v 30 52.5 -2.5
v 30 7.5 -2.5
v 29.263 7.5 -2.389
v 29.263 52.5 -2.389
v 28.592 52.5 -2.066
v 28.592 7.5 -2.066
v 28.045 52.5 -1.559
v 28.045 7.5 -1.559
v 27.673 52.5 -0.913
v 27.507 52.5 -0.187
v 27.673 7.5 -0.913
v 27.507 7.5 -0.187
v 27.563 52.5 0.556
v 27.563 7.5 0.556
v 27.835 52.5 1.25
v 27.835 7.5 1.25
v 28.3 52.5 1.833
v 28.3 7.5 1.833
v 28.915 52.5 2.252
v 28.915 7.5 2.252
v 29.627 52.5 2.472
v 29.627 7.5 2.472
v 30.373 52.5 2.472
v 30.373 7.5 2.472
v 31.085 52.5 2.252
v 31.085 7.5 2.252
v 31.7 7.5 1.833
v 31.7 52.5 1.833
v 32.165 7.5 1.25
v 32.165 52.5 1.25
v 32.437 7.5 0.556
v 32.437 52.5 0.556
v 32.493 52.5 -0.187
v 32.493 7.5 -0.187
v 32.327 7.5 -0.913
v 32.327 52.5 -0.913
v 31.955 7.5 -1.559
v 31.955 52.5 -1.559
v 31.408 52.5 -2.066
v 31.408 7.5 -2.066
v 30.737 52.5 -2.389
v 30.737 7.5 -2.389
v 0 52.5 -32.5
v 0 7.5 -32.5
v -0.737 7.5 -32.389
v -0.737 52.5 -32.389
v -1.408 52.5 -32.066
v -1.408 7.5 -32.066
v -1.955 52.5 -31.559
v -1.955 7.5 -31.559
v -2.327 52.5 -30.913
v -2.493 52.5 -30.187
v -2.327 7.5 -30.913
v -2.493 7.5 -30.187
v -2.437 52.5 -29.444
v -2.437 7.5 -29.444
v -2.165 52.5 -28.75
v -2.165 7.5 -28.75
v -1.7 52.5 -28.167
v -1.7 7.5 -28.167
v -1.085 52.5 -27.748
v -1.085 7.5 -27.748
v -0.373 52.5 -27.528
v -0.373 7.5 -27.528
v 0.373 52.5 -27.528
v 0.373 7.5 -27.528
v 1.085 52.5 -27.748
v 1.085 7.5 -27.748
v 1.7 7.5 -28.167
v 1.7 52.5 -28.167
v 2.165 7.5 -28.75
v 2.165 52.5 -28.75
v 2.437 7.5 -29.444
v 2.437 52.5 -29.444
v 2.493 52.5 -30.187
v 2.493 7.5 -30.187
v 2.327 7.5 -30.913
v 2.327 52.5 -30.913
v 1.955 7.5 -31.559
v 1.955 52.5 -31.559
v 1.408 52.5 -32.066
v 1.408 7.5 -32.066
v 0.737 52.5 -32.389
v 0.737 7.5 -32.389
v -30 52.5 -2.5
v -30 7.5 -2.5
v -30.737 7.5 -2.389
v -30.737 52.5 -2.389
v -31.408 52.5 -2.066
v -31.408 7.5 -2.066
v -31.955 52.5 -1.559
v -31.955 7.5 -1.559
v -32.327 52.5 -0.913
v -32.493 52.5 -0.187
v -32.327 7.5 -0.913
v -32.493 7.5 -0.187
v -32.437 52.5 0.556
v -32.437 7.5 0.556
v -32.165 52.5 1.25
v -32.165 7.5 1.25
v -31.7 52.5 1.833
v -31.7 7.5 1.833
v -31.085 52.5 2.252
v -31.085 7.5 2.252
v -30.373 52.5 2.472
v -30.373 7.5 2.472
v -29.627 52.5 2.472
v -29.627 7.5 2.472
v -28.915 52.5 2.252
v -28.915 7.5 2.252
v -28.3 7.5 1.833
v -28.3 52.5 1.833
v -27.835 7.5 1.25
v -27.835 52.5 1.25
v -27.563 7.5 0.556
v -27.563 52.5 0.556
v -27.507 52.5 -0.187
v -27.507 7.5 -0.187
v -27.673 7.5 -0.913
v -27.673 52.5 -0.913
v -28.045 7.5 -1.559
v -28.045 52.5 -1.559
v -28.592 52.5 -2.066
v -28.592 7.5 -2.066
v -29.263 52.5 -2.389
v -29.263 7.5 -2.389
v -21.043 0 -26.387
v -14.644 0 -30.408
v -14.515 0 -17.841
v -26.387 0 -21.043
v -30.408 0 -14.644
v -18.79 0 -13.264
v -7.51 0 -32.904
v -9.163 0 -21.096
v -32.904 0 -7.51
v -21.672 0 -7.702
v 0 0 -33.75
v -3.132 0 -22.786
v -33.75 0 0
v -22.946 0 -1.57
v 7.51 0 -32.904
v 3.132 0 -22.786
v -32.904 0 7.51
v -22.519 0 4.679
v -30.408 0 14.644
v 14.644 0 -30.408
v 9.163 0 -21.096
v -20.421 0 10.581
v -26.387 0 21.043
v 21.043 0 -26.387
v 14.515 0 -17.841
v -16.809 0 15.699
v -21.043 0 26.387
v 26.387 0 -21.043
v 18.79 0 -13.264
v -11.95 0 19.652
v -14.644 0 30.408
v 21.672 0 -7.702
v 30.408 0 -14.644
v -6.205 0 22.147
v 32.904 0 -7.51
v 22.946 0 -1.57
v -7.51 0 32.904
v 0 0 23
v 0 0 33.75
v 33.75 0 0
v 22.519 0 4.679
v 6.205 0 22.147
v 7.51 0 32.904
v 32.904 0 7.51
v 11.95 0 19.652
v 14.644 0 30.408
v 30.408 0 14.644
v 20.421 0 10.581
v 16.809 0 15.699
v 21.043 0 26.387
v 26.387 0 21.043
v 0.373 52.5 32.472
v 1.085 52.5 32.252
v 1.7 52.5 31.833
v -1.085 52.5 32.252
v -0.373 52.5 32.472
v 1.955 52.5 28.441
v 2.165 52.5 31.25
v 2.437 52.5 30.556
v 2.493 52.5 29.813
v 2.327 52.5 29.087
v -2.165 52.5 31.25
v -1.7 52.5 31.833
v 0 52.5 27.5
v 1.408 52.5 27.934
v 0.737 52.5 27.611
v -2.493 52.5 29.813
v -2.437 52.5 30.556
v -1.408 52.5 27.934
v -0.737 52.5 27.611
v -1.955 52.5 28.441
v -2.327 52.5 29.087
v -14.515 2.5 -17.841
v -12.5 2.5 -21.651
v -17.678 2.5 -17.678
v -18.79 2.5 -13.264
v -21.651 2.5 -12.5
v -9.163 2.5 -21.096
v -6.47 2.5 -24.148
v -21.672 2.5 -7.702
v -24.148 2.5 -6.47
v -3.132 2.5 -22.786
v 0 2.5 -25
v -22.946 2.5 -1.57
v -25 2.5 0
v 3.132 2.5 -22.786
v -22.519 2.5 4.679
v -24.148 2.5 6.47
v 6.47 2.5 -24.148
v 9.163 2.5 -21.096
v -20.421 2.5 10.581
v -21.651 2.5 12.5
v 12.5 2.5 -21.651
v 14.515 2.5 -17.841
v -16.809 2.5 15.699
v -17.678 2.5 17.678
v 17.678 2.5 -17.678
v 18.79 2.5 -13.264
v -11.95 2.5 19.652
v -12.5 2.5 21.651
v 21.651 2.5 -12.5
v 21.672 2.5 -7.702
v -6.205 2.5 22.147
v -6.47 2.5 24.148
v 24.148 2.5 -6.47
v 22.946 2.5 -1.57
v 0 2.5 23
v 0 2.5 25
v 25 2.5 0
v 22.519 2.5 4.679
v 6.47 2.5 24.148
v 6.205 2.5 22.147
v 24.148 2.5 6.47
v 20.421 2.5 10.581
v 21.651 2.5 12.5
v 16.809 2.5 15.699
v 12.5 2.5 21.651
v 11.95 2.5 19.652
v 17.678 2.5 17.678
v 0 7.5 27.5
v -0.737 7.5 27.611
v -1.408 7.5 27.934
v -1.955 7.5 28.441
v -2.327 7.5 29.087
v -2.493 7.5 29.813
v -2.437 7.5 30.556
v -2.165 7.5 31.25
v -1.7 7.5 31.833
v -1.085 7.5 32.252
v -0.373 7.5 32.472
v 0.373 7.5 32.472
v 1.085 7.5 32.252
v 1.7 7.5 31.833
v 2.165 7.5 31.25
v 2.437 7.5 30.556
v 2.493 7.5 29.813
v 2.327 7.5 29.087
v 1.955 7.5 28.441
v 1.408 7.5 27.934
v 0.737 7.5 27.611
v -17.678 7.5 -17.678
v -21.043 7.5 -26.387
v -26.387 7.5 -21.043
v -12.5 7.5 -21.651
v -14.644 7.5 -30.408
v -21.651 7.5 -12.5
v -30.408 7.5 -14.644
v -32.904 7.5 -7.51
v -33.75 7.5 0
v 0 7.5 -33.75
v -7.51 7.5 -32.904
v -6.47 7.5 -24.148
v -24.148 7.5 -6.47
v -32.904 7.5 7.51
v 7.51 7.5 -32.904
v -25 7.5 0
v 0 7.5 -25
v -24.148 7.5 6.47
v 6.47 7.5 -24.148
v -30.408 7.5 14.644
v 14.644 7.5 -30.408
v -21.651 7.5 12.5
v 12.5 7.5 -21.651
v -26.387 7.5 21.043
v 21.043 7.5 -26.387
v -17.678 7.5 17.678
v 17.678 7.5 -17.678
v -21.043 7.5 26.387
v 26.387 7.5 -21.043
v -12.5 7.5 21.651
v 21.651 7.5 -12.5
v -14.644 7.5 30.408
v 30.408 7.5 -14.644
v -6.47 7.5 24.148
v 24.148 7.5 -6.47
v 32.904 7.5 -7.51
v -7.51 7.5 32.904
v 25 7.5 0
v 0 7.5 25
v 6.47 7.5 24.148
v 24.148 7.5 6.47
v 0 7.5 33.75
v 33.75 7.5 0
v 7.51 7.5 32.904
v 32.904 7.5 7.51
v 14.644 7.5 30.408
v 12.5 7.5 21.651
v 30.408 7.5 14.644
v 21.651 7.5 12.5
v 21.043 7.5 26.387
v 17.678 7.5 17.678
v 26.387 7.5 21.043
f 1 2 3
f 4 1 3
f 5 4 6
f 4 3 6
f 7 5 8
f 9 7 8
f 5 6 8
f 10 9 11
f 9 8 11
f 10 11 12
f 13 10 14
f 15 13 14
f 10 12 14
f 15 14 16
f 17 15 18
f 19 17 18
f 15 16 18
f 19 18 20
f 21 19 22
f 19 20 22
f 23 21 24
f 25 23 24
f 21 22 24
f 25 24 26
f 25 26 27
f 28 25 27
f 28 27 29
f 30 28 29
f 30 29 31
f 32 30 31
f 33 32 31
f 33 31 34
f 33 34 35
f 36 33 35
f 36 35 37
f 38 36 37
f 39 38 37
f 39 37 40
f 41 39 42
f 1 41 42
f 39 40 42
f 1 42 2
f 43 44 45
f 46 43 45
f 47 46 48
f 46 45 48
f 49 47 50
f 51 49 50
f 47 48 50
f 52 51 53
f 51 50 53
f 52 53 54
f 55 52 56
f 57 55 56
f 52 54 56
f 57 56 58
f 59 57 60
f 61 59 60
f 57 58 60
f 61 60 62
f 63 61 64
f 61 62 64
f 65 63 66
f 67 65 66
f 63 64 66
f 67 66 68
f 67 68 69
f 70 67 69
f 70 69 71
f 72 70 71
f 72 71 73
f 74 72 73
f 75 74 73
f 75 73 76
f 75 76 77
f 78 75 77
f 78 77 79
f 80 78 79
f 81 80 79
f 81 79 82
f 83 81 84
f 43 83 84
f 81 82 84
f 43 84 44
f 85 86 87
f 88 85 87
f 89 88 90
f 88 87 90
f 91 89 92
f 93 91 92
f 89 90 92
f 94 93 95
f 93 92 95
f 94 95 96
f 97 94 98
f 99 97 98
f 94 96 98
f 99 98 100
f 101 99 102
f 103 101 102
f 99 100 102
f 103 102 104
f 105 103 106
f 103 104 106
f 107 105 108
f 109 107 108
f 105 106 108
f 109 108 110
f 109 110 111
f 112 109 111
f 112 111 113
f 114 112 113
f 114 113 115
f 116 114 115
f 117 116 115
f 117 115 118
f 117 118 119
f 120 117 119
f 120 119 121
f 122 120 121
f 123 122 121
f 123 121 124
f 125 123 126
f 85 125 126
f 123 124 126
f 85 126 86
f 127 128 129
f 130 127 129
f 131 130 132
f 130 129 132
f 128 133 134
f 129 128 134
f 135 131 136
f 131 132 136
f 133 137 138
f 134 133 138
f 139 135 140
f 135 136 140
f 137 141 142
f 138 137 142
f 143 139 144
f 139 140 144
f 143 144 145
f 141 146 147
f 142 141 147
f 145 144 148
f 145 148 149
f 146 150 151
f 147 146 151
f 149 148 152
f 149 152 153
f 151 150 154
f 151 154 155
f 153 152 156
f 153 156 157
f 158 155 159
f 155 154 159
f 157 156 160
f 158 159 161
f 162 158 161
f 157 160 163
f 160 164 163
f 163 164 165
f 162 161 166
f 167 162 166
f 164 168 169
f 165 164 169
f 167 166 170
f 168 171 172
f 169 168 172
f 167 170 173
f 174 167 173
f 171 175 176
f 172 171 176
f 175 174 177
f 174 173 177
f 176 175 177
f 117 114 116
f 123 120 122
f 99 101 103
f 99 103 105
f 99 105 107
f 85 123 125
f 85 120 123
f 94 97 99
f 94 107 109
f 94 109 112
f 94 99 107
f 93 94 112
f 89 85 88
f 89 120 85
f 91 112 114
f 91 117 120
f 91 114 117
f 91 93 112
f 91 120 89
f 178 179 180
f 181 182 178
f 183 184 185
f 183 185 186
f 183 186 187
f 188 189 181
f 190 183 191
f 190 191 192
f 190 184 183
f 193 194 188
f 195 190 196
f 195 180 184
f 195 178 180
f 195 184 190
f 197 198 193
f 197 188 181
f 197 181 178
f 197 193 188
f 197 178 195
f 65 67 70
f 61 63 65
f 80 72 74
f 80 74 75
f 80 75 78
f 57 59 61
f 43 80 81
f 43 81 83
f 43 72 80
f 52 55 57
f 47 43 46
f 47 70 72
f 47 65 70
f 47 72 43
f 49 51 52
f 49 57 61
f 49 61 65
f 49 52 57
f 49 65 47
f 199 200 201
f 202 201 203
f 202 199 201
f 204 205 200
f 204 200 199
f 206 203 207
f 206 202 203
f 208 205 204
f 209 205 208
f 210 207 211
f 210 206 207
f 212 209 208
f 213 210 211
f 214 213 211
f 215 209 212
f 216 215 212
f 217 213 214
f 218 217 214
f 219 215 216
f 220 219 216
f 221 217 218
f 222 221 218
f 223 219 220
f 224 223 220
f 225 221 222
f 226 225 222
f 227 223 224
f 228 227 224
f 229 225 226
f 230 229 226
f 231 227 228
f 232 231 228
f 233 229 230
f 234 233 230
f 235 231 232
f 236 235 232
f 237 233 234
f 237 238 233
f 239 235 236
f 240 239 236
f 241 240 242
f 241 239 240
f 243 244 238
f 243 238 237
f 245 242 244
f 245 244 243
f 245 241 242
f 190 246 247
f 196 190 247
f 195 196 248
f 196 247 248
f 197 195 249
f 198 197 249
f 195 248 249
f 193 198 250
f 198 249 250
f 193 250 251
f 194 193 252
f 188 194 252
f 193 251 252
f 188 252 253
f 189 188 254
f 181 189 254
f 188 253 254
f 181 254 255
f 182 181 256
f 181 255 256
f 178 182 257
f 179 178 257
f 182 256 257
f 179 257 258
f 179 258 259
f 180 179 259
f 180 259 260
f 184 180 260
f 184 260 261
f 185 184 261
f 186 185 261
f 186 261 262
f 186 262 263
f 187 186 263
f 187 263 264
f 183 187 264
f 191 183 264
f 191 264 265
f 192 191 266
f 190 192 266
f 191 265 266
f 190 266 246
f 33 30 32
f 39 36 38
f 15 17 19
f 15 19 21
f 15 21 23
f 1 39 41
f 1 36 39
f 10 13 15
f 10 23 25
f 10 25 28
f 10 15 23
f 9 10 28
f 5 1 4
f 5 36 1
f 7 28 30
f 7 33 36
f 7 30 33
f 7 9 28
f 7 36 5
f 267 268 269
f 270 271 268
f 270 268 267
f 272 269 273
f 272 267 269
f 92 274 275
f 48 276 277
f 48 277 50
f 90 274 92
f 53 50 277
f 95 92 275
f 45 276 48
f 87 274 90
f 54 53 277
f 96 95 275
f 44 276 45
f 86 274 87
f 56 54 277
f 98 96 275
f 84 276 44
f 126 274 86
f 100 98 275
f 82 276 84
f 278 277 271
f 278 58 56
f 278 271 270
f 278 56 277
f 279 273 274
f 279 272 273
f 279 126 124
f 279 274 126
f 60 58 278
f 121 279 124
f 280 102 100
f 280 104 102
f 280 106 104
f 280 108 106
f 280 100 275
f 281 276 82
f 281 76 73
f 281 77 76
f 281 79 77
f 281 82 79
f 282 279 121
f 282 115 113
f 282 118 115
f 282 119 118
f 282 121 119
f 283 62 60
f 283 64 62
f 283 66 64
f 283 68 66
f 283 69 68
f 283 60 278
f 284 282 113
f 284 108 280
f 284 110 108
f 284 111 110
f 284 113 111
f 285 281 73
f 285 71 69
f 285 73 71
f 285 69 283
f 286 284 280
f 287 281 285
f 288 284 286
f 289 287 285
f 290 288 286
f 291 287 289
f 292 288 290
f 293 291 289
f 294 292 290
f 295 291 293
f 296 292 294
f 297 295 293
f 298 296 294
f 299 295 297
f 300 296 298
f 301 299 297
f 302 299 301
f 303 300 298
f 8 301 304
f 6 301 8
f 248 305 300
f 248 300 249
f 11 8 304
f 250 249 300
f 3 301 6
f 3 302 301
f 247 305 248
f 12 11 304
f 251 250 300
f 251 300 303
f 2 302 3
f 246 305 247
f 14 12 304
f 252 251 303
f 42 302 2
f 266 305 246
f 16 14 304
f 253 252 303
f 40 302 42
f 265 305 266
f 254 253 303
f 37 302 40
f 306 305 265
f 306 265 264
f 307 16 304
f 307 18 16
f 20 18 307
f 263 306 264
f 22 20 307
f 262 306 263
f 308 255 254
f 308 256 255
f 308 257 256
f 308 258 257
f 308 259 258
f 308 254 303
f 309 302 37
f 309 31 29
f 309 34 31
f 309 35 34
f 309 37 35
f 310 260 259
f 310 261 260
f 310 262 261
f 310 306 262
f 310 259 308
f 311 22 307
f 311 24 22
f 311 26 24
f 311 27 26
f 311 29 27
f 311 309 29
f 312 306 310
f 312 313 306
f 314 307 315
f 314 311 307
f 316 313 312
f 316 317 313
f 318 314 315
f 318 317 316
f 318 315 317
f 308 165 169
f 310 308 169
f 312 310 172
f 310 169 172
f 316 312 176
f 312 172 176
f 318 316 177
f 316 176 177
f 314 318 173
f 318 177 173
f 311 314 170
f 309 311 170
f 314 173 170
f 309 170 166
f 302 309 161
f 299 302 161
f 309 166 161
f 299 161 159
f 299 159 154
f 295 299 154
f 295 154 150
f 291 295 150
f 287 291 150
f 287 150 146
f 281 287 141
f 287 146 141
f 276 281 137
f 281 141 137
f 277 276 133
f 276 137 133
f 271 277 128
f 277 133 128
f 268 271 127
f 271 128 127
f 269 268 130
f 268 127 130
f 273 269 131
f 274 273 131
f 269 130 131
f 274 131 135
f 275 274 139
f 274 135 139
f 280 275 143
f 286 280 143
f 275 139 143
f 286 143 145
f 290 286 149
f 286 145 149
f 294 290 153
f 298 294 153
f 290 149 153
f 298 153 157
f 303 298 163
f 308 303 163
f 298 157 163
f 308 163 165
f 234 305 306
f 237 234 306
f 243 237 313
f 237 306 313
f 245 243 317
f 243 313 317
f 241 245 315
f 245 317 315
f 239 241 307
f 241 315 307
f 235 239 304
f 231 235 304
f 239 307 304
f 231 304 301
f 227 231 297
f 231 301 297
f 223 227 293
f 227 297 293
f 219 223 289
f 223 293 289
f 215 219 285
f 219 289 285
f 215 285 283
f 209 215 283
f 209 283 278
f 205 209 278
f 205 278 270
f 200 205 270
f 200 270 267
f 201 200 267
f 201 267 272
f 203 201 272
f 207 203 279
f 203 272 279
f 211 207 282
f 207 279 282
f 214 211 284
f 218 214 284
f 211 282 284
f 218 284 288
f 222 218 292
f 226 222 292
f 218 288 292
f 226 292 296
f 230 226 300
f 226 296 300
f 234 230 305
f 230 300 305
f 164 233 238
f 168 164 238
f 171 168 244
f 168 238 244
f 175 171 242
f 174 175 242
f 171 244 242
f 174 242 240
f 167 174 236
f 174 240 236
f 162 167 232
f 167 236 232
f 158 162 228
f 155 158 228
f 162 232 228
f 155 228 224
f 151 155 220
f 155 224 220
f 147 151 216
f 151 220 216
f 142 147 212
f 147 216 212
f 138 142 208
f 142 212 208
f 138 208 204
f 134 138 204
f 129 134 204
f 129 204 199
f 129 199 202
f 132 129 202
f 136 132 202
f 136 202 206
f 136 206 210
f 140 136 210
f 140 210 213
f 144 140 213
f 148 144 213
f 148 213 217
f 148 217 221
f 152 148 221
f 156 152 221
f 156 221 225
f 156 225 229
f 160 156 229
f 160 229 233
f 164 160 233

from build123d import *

# Parameters (mm, degrees)
SKETCH1_R           = 33.75
BOSS_EXTRUDE1_DEPTH = 7.5
SKETCH2_R           = 2.5
BOSS_EXTRUDE2_DEPTH = 45
SKETCH3_R           = 25
CUT_EXTRUDE1_DEPTH  = 5
SKETCH4_R           = 23
CUT_EXTRUDE2_DEPTH  = 70.123982813


with BuildPart() as part:
    # Sketch1 → Boss-Extrude1 (new body)
    with BuildSketch(Plane(origin=(0, 0, 0), x_dir=(1, 0, 0), z_dir=(0, 1, 0))):
        with Locations(Location((0, 0, 0), (0, 0, 270))):
            Circle(SKETCH1_R)
    extrude(amount=BOSS_EXTRUDE1_DEPTH)

    # Sketch2 → Boss-Extrude2 (add)
    with BuildSketch(Plane(origin=(0, 7.5, 0), x_dir=(1, 0, 0), z_dir=(0, 1, 0))):
        with Locations(Location((-30, 0, 0), (0, 0, 90))):
            Circle(SKETCH2_R)
        with Locations(Location((30, 0, 0), (0, 0, 90))):
            Circle(SKETCH2_R)
        with Locations(Location((0, -30, 0), (0, 0, 90))):
            Circle(SKETCH2_R)
        with Locations(Location((0, 30, 0), (0, 0, 90))):
            Circle(SKETCH2_R)
    extrude(amount=BOSS_EXTRUDE2_DEPTH)

    # Sketch3 → Cut-Extrude1 (cut)
    with BuildSketch(Plane(origin=(0, 7.5, 0), x_dir=(1, 0, 0), z_dir=(0, 1, 0))):
        with Locations(Location((0, 0, 0), (0, 0, 270))):
            Circle(SKETCH3_R)
    extrude(amount=-CUT_EXTRUDE1_DEPTH, mode=Mode.SUBTRACT)

    # Sketch4 → Cut-Extrude2 (cut, through all)
    with BuildSketch(Plane(origin=(0, 2.5, 0), x_dir=(1, 0, 0), z_dir=(0, 1, 0))):
        with Locations(Location((0, 0, 0), (0, 0, 270))):
            Circle(SKETCH4_R)
    extrude(amount=-CUT_EXTRUDE2_DEPTH, mode=Mode.SUBTRACT)


solid = part.part
